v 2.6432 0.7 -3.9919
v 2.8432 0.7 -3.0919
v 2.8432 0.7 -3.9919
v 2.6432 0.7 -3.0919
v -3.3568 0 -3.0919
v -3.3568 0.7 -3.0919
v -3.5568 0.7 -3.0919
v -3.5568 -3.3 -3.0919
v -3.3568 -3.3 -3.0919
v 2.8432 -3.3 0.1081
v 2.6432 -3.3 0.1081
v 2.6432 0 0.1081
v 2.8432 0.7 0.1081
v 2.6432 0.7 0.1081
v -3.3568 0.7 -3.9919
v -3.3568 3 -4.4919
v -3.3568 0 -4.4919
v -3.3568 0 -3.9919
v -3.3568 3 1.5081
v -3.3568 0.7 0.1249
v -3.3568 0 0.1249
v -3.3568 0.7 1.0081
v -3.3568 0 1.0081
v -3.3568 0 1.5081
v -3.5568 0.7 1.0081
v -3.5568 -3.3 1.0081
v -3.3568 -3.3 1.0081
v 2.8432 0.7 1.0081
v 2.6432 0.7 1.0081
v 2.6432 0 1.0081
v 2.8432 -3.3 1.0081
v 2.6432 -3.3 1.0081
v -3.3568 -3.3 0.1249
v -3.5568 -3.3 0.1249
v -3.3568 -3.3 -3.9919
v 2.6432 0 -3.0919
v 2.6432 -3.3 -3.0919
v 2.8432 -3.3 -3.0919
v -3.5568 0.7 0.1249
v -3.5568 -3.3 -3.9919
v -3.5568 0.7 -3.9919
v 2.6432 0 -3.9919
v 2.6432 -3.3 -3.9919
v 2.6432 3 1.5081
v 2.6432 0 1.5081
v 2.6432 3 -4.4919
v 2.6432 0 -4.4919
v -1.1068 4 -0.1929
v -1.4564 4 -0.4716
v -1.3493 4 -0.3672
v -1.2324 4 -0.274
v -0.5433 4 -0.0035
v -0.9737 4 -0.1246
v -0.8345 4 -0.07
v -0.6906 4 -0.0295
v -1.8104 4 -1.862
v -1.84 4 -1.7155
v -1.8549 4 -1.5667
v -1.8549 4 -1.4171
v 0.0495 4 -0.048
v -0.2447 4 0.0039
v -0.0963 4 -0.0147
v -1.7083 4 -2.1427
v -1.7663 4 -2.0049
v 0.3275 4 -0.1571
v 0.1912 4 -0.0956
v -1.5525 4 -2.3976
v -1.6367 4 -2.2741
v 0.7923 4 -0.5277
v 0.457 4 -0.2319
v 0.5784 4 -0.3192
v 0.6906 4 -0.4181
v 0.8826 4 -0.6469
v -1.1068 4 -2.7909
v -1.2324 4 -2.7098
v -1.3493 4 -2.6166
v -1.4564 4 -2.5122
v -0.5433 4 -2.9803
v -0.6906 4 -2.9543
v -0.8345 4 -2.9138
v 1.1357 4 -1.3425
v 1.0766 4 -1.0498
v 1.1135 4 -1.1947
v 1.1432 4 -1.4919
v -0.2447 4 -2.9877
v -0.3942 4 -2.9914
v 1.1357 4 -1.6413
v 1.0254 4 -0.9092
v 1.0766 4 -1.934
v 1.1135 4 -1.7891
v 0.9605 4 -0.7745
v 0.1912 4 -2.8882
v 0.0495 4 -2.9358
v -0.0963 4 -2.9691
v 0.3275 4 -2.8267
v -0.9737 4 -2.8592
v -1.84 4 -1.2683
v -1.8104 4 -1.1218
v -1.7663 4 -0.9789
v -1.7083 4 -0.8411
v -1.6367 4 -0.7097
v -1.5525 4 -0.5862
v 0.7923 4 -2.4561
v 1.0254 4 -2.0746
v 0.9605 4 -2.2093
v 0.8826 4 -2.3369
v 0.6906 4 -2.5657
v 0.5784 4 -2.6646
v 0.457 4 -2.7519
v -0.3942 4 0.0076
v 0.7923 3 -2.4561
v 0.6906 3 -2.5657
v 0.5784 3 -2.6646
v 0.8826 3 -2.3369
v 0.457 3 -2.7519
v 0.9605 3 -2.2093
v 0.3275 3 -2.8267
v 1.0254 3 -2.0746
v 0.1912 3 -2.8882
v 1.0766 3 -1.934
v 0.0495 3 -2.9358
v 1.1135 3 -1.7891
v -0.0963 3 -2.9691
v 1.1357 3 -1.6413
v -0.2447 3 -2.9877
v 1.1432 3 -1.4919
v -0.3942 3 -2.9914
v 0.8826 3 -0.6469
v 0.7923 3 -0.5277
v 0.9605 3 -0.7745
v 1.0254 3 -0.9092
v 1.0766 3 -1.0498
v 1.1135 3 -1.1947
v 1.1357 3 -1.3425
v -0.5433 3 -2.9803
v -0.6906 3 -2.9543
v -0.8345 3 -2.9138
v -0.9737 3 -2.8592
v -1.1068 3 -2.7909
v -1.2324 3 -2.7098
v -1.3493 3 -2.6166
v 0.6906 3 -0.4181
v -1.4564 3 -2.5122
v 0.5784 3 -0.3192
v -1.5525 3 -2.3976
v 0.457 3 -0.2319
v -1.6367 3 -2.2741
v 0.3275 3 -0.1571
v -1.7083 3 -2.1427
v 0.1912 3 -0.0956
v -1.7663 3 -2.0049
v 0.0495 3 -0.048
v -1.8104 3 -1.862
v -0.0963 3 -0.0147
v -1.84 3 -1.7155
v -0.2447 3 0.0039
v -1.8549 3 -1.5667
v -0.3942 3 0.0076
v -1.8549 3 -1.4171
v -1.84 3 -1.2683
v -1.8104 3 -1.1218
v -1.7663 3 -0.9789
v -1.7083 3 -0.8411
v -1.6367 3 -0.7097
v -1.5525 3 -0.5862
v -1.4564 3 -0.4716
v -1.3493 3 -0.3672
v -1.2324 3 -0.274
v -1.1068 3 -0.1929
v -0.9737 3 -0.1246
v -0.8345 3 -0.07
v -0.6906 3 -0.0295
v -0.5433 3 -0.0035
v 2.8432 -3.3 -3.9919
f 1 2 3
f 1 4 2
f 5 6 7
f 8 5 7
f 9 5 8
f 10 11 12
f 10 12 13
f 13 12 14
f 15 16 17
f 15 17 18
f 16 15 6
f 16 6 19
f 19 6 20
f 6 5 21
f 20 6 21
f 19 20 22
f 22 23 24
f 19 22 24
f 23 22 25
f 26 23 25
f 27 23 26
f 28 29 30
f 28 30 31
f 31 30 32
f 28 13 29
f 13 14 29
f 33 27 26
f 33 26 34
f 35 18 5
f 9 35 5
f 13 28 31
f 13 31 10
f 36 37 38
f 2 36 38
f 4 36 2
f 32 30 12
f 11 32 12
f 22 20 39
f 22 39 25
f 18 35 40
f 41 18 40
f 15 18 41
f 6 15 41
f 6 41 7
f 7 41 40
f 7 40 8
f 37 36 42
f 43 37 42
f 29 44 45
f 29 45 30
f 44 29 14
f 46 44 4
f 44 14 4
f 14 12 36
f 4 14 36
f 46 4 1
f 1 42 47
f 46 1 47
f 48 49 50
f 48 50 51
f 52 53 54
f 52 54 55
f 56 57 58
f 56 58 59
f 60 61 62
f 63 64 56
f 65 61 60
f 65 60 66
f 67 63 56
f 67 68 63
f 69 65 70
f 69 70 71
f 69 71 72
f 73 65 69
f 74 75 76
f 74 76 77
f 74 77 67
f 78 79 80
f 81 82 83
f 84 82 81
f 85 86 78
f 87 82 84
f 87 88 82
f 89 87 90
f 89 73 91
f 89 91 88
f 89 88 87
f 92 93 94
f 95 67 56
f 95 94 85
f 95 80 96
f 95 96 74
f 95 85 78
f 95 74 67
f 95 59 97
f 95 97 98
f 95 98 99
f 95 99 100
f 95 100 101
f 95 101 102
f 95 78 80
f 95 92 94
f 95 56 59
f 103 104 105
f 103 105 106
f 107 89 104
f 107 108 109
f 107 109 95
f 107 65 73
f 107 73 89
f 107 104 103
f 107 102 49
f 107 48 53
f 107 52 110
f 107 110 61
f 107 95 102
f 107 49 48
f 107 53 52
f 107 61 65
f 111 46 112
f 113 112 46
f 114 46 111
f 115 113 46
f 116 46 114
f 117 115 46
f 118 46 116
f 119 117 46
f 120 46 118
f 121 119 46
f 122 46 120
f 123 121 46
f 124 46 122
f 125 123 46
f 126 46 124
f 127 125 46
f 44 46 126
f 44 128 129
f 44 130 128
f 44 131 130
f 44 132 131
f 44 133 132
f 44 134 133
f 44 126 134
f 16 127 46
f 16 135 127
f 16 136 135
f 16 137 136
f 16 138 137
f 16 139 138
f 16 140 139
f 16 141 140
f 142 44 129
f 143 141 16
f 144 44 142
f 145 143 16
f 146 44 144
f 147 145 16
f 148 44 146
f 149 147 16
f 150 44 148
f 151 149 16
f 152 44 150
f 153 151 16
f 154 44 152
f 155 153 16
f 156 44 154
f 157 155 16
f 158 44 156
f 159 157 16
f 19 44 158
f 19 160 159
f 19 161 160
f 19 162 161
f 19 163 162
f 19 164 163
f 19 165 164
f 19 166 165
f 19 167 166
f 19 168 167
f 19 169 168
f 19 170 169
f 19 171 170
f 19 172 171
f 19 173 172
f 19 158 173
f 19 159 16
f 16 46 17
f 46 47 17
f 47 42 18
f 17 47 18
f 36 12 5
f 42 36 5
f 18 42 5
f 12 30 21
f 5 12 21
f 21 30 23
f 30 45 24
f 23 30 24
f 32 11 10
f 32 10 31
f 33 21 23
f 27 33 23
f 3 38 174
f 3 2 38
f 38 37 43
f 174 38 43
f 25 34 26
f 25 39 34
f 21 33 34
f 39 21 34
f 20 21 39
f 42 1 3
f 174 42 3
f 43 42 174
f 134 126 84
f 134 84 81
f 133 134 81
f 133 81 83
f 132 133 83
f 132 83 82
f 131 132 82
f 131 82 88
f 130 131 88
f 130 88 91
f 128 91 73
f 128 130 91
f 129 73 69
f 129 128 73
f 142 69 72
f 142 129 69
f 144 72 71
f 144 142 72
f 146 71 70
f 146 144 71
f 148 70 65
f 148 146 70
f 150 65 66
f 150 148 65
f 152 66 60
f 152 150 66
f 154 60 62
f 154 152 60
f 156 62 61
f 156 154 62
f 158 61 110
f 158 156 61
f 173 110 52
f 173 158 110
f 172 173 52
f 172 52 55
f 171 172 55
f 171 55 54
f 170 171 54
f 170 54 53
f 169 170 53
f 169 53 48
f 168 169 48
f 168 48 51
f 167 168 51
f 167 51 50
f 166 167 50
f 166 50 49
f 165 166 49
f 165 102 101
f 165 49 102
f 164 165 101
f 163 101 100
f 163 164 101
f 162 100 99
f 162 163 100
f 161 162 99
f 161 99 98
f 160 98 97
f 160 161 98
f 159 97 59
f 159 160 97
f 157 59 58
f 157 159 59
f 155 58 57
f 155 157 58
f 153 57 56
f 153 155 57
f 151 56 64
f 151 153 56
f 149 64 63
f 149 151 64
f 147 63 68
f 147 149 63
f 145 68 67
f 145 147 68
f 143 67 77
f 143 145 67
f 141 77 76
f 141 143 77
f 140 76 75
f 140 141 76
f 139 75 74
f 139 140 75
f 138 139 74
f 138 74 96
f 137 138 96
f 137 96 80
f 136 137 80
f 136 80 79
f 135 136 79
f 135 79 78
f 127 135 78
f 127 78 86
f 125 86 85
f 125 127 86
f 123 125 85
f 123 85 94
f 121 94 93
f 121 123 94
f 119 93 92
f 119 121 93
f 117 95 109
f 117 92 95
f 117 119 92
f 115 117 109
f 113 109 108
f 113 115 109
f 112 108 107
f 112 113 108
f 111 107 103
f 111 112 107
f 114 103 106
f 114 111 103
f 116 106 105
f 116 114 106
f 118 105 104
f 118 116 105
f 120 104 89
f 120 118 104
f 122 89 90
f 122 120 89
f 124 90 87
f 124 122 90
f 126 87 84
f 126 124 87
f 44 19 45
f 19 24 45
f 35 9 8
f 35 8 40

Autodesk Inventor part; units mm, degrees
ref_plane "YZ Plane" through (0, 0, 0) normal (1, 0, 0) x (0, 1, 0)
ref_plane "XZ Plane" through (0, 0, 0) normal (0, 1, 0) x (-1, 0, 0)
ref_plane "XY Plane" through (0, 0, 0) normal (0, 0, 1) x (1, 0, 0)
sketch "Sketch1" plane through (0, 0, 0) normal (0, 1, 0) x (-1, 0, 0)
  line L0 (3.3568, 1.5081) -> (-2.6432, 1.5081)
  line L1 (-2.6432, 1.5081) -> (-2.6432, -4.4919)
  line L2 (-2.6432, -4.4919) -> (3.3568, -4.4919)
  line L3 (3.3568, -4.4919) -> (3.3568, 1.5081)
  point P0 (0, 0)
  dimension "d0" = 6
  dimension "d1" = 6
extrude "Extrusion1" add sketch "Sketch1" along normal blind 3
sketch "Sketch2" plane through (0, 3, 0) normal (0, 1, 0) x (1, 0, 0)
  circle A0 centre (-0.3568, 1.4919) radius 1.5
  line L0 (2.6432, 4.4919) -> (-3.3568, 4.4919) projected
  line L1 (-3.3568, 4.4919) -> (-3.3568, -1.5081) projected
  point P0 (0, 0)
  dimension "d4" = 3
  dimension "d5" = 3
  dimension "d6" = 3
extrude "Extrusion2" add sketch "Sketch2" along normal blind 1
sketch "Sketch4" plane through (2.6432, 0, 1.5081) normal (1, 0, 0) x (0, 0, -1)
  line L0 (0, 0) -> (6, 0) projected
  line L1 (0.5, 0) -> (1.4, 0)
  line L2 (1.4, 0) -> (1.4, 0.7)
  line L3 (1.4, 0.7) -> (0.5, 0.7)
  line L4 (0.5, 0.7) -> (0.5, 0)
  line L5 (0.5, 0) -> (1.4, 0)
  line L6 (1.4, 0) -> (1.4, -3.3)
  line L7 (1.4, -3.3) -> (0.5, -3.3)
  line L8 (0.5, -3.3) -> (0.5, 0)
  line L9 (0, 0) -> (0, 3) projected
  line L10 (3, 0) -> (3, 3)
  line L11 (0, 3) -> (6, 3) projected
  line L12 (5.5, 0) -> (4.6, 0)
  line L13 (4.6, 0) -> (4.6, 0.7)
  line L14 (4.6, 0.7) -> (5.5, 0.7)
  line L15 (5.5, 0.7) -> (5.5, 0)
  line L16 (5.5, 0) -> (4.6, 0)
  line L17 (4.6, 0) -> (4.6, -3.3)
  line L18 (4.6, -3.3) -> (5.5, -3.3)
  line L19 (5.5, -3.3) -> (5.5, 0)
  point P0 (1.5081, 0)
  point P1 (1.4, 0.35)
  point P2 (4.4919, 0)
  point P3 (4.6, 0.35)
  dimension "d9" = 0.9
  dimension "d10" = 0.7
  dimension "d11" = 3.3
  dimension "d12" = 0.5
  dimension "d13" = 0
extrude "Extrusion3" add sketch "Sketch4" along normal blind 0.2 contours L13 L14 L15 L0 | L0 L19 L18 L17 | L4 L3 L2 L0 | L0 L6 L7 L8
sketch "Sketch5" plane through (-3.3568, 0, -4.4919) normal (-1, 0, 0) x (0, 0, 1)
  line L0 (0.5, -3.3) -> (0.5, 0.7) projected
  line L1 (1.4, 0.7) -> (1.4, -3.3) projected
  line L2 (0.5, 0.7) -> (1.4, 0.7)
  line L3 (1.4, 0.7) -> (1.4, -3.3)
  line L4 (1.4, -3.3) -> (0.5, -3.3)
  line L5 (0.5, -3.3) -> (0.5, 0.7)
  line L6 (5.5, 0.7) -> (5.5, -3.3) projected
  line L7 (4.6168, 0.7) -> (5.5, 0.7)
  line L8 (5.5, 0.7) -> (5.5, -3.3)
  line L9 (5.5, -3.3) -> (4.6168, -3.3)
  line L10 (4.6168, -3.3) -> (4.6168, 0.7)
  point P0 (4.4919, 0)
extrude "Extrusion4" add sketch "Sketch5" along normal blind 0.2
properties part number "button"
